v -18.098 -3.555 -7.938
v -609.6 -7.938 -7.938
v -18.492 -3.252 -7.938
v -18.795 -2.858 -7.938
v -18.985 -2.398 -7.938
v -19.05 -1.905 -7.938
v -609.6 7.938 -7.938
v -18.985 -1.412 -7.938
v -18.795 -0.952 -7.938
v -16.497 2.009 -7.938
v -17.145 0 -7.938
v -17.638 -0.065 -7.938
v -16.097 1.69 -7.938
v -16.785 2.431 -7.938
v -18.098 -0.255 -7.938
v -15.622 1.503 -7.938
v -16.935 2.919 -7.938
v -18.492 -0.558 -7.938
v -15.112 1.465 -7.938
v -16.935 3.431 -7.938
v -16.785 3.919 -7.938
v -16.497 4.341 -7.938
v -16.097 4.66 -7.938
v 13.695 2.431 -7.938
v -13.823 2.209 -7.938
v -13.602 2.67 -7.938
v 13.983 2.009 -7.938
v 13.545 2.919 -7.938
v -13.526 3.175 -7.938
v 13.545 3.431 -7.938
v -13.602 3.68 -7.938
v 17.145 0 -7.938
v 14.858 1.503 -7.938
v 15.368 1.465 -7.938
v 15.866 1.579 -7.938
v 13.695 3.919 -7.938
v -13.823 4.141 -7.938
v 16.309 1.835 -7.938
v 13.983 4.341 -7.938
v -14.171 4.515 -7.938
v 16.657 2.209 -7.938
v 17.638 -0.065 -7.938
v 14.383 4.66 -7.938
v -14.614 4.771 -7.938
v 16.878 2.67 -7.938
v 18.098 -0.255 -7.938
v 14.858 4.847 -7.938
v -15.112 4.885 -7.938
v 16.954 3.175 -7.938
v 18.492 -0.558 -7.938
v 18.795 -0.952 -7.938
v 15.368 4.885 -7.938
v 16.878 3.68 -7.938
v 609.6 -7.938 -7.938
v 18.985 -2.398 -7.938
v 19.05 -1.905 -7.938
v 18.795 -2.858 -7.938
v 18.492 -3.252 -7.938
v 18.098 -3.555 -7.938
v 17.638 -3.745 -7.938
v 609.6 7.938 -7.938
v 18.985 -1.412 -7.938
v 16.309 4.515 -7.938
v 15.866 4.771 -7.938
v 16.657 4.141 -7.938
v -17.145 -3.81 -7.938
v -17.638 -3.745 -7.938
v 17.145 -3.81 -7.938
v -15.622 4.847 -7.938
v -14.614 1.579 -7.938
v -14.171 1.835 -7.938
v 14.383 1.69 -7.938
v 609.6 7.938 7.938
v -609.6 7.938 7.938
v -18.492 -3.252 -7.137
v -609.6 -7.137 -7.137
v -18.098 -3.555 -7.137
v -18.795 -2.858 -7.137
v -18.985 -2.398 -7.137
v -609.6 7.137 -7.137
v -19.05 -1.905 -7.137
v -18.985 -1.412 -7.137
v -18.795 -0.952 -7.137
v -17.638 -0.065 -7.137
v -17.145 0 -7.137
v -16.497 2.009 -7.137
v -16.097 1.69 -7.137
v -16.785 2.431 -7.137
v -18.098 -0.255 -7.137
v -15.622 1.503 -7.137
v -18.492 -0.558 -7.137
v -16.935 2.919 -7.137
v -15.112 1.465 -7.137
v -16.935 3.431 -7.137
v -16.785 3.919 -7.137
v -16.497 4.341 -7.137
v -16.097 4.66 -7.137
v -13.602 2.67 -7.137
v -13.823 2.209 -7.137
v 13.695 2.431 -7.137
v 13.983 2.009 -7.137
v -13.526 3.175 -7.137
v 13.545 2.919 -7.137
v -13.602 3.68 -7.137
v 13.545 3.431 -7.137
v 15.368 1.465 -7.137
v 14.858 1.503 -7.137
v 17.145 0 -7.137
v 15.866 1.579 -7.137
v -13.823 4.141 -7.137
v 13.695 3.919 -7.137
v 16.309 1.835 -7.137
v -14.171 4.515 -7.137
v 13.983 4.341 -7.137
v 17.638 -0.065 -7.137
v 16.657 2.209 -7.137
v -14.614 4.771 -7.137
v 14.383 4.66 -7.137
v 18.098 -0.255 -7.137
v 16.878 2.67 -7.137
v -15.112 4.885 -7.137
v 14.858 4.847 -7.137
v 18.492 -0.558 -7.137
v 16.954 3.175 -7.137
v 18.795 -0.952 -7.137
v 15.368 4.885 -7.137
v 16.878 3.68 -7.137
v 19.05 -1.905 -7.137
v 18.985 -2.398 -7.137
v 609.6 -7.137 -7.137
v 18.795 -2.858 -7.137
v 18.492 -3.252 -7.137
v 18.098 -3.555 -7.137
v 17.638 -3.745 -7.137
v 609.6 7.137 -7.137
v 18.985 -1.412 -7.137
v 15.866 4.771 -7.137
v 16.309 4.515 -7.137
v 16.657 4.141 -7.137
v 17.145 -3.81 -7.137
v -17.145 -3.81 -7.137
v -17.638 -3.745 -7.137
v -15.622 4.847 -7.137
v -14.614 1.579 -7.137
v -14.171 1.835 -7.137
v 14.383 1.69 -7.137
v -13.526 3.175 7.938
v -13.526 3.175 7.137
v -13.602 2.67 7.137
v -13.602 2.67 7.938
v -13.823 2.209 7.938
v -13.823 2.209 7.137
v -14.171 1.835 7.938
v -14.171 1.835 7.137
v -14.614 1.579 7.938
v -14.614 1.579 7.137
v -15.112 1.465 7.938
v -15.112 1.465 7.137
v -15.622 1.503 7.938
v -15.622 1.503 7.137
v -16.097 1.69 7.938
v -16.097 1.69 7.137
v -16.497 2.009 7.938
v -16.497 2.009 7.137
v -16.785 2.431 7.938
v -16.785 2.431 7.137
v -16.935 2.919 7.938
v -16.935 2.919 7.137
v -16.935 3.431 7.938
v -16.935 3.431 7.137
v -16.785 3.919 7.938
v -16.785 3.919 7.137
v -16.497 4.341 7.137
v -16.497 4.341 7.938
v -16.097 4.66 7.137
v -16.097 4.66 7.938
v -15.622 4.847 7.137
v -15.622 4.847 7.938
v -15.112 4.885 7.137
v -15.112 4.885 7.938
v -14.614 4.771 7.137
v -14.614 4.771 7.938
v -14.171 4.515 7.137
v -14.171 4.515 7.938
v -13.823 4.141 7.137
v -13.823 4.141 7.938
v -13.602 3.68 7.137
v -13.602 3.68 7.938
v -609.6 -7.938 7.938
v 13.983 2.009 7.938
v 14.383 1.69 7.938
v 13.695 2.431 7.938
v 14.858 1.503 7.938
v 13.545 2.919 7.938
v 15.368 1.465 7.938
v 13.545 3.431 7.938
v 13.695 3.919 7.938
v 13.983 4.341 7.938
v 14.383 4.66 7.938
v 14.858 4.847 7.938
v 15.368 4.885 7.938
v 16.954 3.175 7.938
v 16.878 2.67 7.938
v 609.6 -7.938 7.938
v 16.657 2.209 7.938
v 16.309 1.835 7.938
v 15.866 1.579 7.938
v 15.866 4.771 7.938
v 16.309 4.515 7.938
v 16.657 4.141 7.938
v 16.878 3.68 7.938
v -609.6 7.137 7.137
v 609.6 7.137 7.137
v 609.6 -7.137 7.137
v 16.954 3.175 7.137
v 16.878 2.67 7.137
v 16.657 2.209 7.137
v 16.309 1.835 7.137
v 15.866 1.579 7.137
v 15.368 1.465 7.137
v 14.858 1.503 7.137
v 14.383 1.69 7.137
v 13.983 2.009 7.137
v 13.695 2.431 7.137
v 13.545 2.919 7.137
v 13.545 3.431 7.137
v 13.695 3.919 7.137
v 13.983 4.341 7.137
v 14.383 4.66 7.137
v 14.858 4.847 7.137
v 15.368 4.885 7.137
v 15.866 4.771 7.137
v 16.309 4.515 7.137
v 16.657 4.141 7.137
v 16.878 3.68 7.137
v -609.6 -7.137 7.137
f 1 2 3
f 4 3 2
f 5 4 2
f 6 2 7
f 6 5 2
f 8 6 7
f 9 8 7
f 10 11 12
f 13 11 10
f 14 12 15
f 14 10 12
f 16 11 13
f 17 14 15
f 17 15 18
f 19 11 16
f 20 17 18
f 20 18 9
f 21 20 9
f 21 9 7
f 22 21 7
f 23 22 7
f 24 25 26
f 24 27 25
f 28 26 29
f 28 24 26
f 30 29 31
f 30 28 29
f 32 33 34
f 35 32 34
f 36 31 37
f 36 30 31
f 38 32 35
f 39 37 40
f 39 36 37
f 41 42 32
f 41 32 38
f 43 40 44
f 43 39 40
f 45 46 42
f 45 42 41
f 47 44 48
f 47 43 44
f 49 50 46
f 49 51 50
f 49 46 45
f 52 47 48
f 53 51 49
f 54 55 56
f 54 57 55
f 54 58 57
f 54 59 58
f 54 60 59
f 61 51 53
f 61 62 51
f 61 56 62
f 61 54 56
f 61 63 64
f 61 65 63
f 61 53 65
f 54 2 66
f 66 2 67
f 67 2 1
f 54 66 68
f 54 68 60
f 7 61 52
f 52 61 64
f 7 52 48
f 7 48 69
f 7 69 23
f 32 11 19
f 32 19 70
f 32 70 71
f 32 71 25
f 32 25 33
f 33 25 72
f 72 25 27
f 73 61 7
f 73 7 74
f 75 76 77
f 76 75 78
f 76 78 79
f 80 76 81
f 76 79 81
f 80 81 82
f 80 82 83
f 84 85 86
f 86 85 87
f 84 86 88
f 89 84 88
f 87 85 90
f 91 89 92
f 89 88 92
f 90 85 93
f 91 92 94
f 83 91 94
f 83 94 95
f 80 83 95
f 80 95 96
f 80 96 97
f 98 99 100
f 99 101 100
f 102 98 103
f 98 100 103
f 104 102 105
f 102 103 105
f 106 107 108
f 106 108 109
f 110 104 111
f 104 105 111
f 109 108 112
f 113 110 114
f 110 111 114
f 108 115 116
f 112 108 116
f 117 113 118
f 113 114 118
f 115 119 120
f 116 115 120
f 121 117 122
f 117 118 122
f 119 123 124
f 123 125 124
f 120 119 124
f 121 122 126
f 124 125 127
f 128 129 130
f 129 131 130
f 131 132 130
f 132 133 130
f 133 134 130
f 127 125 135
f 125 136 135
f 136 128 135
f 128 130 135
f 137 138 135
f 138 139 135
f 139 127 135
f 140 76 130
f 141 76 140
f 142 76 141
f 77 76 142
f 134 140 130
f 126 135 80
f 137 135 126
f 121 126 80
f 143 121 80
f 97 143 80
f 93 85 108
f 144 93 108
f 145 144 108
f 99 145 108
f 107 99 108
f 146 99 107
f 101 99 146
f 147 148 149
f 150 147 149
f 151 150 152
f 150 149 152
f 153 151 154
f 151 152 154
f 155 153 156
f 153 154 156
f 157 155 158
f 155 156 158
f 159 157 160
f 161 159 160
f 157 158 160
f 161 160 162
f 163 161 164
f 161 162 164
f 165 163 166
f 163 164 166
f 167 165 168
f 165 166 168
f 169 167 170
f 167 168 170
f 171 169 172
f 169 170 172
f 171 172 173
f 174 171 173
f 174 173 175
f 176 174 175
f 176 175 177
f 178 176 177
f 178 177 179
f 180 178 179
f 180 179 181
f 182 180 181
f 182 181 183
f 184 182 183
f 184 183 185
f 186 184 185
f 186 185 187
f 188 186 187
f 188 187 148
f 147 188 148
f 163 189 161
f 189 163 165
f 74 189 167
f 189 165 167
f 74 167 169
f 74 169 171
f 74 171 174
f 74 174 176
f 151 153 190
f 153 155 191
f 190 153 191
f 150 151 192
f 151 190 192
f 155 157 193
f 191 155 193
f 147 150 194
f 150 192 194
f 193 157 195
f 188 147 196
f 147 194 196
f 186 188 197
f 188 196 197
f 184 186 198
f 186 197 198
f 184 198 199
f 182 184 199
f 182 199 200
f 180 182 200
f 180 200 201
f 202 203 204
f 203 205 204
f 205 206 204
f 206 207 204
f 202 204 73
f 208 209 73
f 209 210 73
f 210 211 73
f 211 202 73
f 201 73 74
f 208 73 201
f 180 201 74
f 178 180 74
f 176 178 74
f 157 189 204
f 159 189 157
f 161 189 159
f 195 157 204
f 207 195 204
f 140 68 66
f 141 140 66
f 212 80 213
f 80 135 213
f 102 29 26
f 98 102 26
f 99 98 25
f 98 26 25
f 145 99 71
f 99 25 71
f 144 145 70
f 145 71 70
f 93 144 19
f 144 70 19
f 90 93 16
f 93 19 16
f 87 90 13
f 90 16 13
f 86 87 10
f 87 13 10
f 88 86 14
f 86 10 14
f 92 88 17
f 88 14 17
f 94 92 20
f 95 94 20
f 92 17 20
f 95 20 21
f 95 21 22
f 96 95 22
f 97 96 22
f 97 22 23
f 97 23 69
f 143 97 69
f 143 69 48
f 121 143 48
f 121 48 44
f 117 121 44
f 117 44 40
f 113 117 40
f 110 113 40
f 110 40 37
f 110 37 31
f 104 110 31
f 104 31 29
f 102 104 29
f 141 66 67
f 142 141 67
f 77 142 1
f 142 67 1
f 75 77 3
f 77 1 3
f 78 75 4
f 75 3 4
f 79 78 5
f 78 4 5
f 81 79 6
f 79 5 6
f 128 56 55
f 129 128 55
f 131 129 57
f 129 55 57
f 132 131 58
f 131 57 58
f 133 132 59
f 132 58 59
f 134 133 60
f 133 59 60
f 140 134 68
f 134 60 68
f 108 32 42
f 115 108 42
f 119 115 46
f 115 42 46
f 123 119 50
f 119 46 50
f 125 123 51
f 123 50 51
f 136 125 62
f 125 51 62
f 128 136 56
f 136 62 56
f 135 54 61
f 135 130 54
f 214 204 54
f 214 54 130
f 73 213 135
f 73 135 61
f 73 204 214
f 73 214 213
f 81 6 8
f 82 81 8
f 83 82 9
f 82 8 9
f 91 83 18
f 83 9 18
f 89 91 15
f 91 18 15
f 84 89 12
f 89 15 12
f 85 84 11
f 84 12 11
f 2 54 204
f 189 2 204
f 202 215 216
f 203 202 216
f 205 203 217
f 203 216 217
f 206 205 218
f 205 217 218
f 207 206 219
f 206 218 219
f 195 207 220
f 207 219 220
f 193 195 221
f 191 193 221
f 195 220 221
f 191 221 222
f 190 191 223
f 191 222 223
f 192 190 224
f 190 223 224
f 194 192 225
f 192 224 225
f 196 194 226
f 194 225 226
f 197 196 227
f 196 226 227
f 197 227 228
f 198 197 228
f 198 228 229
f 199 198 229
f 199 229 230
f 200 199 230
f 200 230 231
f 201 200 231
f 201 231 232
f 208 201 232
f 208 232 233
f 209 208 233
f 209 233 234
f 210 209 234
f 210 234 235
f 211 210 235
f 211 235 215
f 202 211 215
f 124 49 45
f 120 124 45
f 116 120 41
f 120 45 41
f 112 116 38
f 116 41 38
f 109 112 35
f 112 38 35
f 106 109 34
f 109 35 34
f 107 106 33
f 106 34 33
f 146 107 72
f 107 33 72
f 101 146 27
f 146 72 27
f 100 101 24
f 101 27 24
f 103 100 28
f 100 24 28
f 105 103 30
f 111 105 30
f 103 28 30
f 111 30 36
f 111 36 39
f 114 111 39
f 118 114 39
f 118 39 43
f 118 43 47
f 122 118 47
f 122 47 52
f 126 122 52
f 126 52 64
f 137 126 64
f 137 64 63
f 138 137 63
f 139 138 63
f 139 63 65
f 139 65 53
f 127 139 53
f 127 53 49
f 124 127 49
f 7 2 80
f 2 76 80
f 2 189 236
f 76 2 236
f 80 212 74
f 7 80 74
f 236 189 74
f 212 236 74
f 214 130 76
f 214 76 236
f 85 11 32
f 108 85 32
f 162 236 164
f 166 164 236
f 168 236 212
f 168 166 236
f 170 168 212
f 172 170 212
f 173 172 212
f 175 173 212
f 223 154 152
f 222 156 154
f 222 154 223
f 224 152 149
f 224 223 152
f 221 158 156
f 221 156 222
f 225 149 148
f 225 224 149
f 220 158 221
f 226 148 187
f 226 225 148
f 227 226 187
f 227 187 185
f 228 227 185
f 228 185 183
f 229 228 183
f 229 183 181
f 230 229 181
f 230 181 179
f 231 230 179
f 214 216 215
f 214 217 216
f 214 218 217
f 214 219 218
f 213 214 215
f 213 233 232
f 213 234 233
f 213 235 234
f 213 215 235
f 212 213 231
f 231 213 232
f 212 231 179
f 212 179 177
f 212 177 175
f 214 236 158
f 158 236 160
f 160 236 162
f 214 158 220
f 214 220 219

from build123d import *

# Parameters (mm, degrees)
F0_W     = 15.875
F0_H     = 15.875
F0_W_2   = 14.2748
F0_H_2   = 14.2748
F1_DEPTH = 609.6
F3_DEPTH = 5.08
F4_R     = 1.7145
F5_DEPTH = 15.876


with BuildPart() as f1:
    # F0 (on Right) → F1 (new body, symmetric)
    with BuildSketch(Plane.YZ):
        Rectangle(F0_W, F0_H)
        Rectangle(F0_W_2, F0_H_2, mode=Mode.SUBTRACT)
    extrude(amount=F1_DEPTH, both=True)

    # F2 (on face) → F3 (cut)
    with BuildSketch(Plane(origin=(0, 0, -7.9375), x_dir=(1, 0, 0), z_dir=(0, 0, -1))):
        with BuildLine():
            Line((-17.145, 0), (17.145, 0))
            ThreePointArc((17.145, 0), (18.4920384182, 0.5579615818), (19.05, 1.905))
            ThreePointArc((19.05, 1.905), (18.4920384182, 3.2520384182), (17.145, 3.81))
            Line((17.145, 3.81), (-17.145, 3.81))
            ThreePointArc((-17.145, 3.81), (-18.4920384182, 3.2520384182), (-19.05, 1.905))
            ThreePointArc((-19.05, 1.905), (-18.4920384182, 0.5579615818), (-17.145, 0))
        make_face()
    extrude(amount=-F3_DEPTH, mode=Mode.SUBTRACT)

    # F4 (on face) → F5 (cut, through all)
    with BuildSketch(Plane(origin=(0, 0, -7.9375), x_dir=(1, 0, 0), z_dir=(0, 0, -1))):
        with Locations((-15.24, -3.175)):
            Circle(F4_R)
        with Locations((15.24, -3.175)):
            Circle(F4_R)
    extrude(amount=-F5_DEPTH, mode=Mode.SUBTRACT)


solid = f1.part
